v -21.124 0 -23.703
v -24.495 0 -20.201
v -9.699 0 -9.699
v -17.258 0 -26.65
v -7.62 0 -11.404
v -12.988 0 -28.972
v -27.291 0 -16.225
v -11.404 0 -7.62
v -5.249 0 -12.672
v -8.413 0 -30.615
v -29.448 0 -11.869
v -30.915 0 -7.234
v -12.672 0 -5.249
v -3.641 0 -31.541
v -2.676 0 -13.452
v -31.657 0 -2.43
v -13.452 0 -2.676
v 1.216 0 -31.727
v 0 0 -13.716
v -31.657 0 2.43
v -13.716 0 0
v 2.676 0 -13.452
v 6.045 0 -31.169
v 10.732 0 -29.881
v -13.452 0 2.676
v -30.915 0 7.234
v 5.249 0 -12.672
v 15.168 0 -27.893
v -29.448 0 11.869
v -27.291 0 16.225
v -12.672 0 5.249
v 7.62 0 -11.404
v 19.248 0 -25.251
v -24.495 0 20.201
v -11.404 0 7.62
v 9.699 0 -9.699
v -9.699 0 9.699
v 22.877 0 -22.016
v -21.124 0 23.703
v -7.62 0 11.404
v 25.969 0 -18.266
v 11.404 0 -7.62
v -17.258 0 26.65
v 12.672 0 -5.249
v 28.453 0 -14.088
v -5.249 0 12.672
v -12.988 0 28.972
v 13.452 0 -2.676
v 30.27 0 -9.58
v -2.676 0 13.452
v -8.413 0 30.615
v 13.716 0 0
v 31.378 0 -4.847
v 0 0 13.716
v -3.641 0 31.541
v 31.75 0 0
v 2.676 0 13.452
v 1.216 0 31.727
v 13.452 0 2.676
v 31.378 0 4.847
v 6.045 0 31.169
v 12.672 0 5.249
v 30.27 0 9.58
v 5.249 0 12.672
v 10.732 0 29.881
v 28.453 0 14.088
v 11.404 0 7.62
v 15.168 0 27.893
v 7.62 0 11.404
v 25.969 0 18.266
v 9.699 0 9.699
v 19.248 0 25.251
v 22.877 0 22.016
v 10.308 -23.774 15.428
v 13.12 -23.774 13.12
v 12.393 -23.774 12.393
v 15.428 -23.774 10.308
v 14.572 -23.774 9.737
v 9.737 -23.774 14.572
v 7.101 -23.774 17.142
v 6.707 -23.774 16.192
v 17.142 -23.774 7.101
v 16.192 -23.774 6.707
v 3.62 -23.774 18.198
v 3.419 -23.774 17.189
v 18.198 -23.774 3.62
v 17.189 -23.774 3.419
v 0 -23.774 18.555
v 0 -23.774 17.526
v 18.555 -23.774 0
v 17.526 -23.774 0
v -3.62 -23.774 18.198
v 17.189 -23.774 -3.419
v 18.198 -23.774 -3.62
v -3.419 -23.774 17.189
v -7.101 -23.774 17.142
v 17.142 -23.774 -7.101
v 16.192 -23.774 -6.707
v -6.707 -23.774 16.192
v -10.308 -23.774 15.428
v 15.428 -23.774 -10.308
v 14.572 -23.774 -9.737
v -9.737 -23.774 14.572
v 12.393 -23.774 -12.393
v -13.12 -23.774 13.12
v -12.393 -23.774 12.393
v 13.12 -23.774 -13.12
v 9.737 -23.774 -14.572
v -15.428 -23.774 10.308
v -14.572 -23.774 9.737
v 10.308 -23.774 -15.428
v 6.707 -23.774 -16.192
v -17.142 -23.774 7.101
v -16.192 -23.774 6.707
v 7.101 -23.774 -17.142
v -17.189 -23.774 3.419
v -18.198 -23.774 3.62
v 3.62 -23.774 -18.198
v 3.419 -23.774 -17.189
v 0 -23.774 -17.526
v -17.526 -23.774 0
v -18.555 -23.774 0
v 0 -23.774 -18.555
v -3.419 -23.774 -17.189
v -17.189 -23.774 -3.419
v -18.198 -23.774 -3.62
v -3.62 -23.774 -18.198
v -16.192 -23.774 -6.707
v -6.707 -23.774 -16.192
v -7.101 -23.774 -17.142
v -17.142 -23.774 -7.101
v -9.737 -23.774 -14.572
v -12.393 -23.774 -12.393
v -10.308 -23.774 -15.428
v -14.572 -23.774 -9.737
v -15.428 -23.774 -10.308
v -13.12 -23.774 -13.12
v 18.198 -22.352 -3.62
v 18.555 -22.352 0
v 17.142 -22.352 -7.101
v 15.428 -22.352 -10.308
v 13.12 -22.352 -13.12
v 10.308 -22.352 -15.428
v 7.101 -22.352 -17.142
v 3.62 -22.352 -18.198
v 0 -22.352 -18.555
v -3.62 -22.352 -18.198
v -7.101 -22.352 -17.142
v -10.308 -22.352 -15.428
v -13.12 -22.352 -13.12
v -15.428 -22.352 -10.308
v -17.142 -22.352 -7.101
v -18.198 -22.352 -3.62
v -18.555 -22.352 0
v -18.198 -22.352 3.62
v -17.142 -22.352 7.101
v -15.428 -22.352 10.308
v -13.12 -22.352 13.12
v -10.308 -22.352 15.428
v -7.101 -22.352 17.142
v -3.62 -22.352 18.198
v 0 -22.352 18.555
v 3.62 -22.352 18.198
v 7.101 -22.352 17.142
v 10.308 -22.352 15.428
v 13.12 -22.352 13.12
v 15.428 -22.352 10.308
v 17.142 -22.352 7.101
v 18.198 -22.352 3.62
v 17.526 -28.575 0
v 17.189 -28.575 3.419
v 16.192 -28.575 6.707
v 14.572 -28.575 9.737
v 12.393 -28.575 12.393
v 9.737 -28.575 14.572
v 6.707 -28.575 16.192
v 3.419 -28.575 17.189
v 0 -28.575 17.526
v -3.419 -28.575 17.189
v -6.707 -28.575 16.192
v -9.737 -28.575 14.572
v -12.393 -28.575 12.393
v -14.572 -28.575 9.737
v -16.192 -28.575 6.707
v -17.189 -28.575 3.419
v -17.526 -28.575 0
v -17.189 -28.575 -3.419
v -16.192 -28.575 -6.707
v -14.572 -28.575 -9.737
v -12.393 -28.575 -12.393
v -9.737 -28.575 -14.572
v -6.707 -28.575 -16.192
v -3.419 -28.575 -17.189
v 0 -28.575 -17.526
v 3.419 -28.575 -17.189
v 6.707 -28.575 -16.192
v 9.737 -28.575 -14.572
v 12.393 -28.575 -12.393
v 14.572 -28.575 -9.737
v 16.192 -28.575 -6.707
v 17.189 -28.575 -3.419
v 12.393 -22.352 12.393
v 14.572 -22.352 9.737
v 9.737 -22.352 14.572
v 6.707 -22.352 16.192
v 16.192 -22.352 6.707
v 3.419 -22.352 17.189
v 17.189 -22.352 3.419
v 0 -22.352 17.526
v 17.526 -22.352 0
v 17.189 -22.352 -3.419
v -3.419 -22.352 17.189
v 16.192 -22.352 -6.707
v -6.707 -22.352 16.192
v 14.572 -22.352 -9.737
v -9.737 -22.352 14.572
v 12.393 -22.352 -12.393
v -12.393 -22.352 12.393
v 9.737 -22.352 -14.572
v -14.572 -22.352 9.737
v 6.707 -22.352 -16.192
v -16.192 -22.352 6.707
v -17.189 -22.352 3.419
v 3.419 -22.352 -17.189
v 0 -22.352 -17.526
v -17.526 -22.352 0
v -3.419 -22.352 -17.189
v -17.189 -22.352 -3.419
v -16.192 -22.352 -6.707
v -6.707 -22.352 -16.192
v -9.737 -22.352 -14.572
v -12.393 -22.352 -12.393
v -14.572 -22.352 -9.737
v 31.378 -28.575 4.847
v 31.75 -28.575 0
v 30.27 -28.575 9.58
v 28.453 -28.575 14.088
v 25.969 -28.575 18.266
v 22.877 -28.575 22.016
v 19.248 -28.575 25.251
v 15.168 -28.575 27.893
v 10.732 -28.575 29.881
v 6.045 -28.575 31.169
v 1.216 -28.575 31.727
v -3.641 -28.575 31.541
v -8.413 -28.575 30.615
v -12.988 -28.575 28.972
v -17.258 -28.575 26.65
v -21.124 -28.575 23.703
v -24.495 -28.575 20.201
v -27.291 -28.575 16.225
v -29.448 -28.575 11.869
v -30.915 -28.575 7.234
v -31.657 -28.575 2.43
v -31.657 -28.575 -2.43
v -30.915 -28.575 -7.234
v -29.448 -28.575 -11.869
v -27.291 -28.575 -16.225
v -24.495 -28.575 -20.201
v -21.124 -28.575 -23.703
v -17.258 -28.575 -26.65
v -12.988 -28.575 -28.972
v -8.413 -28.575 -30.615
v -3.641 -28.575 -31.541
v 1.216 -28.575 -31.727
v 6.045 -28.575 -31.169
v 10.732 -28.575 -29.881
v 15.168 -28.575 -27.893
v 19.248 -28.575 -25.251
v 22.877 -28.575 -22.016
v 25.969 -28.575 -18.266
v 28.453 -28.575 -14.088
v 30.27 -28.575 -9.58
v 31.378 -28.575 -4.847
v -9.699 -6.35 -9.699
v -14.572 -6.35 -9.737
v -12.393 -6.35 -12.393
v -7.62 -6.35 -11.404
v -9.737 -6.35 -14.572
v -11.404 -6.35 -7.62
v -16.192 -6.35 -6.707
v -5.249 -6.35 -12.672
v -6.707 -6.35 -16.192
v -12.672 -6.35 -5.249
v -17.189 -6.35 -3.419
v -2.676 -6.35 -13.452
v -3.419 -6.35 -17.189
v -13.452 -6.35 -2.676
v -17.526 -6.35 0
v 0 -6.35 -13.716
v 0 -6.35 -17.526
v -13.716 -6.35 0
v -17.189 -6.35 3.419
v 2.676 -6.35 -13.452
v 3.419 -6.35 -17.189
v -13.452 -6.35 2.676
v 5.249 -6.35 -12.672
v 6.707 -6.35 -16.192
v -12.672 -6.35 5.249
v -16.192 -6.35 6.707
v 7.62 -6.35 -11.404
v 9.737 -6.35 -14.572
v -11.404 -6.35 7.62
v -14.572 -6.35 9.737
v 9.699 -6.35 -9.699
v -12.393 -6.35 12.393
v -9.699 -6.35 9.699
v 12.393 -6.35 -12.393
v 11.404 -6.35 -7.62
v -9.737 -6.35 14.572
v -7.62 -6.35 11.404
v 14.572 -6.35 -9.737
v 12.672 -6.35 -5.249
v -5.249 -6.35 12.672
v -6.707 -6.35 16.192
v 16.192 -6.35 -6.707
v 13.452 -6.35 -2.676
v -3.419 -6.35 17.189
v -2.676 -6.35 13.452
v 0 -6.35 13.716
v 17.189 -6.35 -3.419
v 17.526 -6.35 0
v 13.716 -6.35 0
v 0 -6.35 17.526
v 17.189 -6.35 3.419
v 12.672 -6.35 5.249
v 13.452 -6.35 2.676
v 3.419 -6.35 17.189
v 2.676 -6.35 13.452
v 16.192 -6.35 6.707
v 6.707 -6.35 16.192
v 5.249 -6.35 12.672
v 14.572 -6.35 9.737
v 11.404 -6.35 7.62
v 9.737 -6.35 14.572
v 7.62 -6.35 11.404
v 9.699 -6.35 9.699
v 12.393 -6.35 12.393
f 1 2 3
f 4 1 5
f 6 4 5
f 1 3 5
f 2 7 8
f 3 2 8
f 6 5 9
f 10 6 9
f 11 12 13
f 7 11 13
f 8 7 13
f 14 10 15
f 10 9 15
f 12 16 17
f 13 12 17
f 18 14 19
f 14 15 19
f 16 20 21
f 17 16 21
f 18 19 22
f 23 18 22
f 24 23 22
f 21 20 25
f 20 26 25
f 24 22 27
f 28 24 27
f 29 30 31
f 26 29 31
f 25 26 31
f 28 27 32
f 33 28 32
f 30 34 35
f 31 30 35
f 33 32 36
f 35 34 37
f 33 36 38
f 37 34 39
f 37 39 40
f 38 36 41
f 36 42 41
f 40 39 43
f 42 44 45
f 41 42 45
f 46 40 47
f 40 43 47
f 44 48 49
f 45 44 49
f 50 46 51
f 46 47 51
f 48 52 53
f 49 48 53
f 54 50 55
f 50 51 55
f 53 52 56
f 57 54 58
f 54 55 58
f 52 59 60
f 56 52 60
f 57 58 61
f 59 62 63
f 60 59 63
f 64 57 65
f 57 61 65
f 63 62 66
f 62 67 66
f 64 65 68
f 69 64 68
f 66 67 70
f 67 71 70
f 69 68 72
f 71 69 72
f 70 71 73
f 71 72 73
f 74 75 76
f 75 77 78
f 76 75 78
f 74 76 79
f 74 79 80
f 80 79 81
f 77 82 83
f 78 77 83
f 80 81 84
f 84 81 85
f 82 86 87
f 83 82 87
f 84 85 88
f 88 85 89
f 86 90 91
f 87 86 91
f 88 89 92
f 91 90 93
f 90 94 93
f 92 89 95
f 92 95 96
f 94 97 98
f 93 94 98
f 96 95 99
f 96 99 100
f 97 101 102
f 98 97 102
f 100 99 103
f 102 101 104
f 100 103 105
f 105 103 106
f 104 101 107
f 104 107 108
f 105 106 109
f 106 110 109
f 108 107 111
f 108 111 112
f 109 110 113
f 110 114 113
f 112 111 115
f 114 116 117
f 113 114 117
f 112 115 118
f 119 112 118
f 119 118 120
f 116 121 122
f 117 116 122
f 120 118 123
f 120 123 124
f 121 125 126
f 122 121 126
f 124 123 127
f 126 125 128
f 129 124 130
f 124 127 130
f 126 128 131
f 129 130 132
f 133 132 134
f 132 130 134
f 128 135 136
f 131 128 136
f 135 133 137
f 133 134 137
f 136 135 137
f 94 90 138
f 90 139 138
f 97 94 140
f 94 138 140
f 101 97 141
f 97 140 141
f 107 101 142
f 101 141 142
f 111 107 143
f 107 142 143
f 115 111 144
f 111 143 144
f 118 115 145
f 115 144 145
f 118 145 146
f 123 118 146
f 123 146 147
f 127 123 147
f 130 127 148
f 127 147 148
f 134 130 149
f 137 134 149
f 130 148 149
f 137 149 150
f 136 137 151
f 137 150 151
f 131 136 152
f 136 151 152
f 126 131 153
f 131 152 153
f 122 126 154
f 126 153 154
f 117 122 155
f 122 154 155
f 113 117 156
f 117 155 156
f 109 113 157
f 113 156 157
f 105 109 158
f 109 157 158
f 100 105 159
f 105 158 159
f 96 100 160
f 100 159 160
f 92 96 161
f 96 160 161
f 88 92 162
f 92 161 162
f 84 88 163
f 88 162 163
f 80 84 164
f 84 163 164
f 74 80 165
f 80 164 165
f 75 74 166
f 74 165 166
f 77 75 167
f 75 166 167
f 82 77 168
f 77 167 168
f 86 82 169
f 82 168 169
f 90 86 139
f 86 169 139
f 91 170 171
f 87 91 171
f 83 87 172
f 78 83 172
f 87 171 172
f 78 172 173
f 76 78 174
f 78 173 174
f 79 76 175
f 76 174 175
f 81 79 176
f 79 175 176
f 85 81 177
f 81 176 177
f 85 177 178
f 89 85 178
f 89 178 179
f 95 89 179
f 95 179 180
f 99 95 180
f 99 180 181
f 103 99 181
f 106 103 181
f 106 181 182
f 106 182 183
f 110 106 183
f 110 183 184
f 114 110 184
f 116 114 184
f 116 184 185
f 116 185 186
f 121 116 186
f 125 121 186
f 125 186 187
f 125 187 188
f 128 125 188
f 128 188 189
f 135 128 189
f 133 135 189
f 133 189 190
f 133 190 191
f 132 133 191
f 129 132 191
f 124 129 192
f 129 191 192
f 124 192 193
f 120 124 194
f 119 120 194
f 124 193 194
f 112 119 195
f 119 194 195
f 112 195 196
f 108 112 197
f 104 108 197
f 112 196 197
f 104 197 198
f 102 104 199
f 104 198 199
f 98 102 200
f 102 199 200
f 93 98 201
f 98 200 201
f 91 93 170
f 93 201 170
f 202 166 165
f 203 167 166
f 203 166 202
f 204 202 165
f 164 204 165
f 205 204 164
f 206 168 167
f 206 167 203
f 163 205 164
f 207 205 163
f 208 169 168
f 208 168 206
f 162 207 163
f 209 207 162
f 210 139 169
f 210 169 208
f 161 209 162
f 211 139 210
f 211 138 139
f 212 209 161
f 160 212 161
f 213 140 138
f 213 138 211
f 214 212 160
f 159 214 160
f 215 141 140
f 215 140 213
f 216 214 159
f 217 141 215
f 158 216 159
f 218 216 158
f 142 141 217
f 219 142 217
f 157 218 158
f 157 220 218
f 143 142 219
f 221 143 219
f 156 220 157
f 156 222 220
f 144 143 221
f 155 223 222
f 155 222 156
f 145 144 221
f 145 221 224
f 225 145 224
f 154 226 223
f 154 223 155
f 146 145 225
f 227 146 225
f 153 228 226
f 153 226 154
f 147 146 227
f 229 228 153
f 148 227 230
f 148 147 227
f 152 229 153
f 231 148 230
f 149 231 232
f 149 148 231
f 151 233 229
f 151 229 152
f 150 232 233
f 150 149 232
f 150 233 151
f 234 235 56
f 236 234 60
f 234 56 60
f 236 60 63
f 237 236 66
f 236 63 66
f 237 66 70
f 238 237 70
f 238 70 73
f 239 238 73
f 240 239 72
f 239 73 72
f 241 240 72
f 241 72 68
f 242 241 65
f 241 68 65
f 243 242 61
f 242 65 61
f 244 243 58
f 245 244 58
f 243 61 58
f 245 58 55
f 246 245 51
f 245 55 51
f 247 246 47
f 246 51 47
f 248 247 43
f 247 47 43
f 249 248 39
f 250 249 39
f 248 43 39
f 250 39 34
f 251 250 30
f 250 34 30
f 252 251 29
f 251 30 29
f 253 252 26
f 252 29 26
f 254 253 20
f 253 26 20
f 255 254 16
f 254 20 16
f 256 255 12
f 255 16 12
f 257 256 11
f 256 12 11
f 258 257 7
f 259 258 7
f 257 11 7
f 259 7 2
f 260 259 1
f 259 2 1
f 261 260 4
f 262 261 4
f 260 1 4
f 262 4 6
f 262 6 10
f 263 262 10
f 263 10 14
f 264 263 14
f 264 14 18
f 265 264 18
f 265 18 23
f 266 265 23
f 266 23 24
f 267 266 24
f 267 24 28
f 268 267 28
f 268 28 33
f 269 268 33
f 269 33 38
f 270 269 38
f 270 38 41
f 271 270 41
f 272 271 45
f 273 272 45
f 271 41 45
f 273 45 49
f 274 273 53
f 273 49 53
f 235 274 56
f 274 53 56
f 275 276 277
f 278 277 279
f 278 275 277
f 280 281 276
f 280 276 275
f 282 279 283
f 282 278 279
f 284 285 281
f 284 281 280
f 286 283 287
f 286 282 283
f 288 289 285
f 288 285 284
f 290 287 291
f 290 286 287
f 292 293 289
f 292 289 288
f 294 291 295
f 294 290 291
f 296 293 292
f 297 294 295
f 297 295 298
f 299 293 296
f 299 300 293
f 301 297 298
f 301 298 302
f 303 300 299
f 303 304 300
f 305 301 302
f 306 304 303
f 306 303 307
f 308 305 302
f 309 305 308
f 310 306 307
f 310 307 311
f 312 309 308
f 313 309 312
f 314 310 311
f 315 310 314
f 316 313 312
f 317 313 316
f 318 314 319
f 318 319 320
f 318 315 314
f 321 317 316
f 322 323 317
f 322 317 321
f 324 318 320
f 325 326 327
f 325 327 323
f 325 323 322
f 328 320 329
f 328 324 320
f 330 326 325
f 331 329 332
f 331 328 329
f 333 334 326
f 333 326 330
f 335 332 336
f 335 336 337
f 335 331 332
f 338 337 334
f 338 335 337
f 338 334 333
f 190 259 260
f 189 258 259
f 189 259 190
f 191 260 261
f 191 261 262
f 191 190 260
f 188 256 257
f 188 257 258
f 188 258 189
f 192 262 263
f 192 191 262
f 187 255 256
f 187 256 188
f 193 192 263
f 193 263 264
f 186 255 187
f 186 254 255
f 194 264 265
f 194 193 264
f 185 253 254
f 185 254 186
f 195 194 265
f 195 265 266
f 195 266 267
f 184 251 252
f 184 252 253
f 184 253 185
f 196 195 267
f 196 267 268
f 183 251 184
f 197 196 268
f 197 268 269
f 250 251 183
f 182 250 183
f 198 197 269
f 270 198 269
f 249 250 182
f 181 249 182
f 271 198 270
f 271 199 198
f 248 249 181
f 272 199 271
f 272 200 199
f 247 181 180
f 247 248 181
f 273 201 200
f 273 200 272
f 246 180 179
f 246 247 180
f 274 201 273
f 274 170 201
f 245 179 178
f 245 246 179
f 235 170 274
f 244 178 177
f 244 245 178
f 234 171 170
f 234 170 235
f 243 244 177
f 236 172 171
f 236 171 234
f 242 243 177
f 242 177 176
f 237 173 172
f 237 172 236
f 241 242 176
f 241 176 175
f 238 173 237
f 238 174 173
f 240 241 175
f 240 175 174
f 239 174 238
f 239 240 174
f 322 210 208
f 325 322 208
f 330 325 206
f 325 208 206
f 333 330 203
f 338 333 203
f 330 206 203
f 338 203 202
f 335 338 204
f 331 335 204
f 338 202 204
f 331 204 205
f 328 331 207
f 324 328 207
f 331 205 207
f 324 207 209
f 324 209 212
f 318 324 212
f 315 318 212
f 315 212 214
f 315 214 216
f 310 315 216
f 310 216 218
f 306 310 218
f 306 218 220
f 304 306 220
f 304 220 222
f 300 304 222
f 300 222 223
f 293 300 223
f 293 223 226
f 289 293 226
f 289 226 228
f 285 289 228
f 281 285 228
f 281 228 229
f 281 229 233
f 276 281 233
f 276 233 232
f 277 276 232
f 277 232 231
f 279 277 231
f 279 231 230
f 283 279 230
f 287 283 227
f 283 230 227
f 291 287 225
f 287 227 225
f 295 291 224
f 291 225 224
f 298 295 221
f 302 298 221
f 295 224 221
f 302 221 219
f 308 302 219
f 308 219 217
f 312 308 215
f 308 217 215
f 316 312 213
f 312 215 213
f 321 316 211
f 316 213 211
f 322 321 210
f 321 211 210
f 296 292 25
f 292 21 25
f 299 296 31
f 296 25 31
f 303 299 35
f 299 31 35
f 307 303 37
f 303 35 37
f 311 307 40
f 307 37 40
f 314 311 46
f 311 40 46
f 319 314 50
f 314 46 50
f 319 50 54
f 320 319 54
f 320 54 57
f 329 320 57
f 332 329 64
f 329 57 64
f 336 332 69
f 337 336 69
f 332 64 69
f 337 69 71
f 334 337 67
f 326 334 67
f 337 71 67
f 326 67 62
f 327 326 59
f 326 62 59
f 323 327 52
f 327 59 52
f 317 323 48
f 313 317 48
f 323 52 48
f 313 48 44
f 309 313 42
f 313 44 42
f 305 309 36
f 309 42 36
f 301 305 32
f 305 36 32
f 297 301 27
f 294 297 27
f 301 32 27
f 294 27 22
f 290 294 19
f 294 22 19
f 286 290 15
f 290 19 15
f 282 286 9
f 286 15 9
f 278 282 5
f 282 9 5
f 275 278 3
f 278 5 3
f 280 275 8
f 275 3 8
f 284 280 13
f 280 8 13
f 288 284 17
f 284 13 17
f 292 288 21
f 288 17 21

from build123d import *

# Parameters (mm, degrees)
F0_R           = 31.75
F1_DEPTH       = 28.575
F3_D           = 27.432
F3_CBORE_D     = 35.052
F3_CBORE_DEPTH = 22.225
F4_W           = 11.247322
F4_H           = 1.4224


with BuildPart() as f1:
    # F0 (on Front) → F1 (new body)
    with BuildSketch(Plane.XZ):
        Circle(F0_R)
    extrude(amount=F1_DEPTH)

    # F3 (through all)
    with Locations(Plane.XZ.offset(28.575)):
        with Locations((0, 0)):
            CounterBoreHole(F3_D / 2, F3_CBORE_D / 2, F3_CBORE_DEPTH)

    # F4 (on Top) → F5 (revolve, cut)
    with BuildSketch(Plane.XY):
        with Locations((12.931039, -23.0632)):
            Rectangle(F4_W, F4_H)
    revolve(axis=Axis((0, 2.595396, 0), (0, 1, 0)), mode=Mode.SUBTRACT)


solid = f1.part
